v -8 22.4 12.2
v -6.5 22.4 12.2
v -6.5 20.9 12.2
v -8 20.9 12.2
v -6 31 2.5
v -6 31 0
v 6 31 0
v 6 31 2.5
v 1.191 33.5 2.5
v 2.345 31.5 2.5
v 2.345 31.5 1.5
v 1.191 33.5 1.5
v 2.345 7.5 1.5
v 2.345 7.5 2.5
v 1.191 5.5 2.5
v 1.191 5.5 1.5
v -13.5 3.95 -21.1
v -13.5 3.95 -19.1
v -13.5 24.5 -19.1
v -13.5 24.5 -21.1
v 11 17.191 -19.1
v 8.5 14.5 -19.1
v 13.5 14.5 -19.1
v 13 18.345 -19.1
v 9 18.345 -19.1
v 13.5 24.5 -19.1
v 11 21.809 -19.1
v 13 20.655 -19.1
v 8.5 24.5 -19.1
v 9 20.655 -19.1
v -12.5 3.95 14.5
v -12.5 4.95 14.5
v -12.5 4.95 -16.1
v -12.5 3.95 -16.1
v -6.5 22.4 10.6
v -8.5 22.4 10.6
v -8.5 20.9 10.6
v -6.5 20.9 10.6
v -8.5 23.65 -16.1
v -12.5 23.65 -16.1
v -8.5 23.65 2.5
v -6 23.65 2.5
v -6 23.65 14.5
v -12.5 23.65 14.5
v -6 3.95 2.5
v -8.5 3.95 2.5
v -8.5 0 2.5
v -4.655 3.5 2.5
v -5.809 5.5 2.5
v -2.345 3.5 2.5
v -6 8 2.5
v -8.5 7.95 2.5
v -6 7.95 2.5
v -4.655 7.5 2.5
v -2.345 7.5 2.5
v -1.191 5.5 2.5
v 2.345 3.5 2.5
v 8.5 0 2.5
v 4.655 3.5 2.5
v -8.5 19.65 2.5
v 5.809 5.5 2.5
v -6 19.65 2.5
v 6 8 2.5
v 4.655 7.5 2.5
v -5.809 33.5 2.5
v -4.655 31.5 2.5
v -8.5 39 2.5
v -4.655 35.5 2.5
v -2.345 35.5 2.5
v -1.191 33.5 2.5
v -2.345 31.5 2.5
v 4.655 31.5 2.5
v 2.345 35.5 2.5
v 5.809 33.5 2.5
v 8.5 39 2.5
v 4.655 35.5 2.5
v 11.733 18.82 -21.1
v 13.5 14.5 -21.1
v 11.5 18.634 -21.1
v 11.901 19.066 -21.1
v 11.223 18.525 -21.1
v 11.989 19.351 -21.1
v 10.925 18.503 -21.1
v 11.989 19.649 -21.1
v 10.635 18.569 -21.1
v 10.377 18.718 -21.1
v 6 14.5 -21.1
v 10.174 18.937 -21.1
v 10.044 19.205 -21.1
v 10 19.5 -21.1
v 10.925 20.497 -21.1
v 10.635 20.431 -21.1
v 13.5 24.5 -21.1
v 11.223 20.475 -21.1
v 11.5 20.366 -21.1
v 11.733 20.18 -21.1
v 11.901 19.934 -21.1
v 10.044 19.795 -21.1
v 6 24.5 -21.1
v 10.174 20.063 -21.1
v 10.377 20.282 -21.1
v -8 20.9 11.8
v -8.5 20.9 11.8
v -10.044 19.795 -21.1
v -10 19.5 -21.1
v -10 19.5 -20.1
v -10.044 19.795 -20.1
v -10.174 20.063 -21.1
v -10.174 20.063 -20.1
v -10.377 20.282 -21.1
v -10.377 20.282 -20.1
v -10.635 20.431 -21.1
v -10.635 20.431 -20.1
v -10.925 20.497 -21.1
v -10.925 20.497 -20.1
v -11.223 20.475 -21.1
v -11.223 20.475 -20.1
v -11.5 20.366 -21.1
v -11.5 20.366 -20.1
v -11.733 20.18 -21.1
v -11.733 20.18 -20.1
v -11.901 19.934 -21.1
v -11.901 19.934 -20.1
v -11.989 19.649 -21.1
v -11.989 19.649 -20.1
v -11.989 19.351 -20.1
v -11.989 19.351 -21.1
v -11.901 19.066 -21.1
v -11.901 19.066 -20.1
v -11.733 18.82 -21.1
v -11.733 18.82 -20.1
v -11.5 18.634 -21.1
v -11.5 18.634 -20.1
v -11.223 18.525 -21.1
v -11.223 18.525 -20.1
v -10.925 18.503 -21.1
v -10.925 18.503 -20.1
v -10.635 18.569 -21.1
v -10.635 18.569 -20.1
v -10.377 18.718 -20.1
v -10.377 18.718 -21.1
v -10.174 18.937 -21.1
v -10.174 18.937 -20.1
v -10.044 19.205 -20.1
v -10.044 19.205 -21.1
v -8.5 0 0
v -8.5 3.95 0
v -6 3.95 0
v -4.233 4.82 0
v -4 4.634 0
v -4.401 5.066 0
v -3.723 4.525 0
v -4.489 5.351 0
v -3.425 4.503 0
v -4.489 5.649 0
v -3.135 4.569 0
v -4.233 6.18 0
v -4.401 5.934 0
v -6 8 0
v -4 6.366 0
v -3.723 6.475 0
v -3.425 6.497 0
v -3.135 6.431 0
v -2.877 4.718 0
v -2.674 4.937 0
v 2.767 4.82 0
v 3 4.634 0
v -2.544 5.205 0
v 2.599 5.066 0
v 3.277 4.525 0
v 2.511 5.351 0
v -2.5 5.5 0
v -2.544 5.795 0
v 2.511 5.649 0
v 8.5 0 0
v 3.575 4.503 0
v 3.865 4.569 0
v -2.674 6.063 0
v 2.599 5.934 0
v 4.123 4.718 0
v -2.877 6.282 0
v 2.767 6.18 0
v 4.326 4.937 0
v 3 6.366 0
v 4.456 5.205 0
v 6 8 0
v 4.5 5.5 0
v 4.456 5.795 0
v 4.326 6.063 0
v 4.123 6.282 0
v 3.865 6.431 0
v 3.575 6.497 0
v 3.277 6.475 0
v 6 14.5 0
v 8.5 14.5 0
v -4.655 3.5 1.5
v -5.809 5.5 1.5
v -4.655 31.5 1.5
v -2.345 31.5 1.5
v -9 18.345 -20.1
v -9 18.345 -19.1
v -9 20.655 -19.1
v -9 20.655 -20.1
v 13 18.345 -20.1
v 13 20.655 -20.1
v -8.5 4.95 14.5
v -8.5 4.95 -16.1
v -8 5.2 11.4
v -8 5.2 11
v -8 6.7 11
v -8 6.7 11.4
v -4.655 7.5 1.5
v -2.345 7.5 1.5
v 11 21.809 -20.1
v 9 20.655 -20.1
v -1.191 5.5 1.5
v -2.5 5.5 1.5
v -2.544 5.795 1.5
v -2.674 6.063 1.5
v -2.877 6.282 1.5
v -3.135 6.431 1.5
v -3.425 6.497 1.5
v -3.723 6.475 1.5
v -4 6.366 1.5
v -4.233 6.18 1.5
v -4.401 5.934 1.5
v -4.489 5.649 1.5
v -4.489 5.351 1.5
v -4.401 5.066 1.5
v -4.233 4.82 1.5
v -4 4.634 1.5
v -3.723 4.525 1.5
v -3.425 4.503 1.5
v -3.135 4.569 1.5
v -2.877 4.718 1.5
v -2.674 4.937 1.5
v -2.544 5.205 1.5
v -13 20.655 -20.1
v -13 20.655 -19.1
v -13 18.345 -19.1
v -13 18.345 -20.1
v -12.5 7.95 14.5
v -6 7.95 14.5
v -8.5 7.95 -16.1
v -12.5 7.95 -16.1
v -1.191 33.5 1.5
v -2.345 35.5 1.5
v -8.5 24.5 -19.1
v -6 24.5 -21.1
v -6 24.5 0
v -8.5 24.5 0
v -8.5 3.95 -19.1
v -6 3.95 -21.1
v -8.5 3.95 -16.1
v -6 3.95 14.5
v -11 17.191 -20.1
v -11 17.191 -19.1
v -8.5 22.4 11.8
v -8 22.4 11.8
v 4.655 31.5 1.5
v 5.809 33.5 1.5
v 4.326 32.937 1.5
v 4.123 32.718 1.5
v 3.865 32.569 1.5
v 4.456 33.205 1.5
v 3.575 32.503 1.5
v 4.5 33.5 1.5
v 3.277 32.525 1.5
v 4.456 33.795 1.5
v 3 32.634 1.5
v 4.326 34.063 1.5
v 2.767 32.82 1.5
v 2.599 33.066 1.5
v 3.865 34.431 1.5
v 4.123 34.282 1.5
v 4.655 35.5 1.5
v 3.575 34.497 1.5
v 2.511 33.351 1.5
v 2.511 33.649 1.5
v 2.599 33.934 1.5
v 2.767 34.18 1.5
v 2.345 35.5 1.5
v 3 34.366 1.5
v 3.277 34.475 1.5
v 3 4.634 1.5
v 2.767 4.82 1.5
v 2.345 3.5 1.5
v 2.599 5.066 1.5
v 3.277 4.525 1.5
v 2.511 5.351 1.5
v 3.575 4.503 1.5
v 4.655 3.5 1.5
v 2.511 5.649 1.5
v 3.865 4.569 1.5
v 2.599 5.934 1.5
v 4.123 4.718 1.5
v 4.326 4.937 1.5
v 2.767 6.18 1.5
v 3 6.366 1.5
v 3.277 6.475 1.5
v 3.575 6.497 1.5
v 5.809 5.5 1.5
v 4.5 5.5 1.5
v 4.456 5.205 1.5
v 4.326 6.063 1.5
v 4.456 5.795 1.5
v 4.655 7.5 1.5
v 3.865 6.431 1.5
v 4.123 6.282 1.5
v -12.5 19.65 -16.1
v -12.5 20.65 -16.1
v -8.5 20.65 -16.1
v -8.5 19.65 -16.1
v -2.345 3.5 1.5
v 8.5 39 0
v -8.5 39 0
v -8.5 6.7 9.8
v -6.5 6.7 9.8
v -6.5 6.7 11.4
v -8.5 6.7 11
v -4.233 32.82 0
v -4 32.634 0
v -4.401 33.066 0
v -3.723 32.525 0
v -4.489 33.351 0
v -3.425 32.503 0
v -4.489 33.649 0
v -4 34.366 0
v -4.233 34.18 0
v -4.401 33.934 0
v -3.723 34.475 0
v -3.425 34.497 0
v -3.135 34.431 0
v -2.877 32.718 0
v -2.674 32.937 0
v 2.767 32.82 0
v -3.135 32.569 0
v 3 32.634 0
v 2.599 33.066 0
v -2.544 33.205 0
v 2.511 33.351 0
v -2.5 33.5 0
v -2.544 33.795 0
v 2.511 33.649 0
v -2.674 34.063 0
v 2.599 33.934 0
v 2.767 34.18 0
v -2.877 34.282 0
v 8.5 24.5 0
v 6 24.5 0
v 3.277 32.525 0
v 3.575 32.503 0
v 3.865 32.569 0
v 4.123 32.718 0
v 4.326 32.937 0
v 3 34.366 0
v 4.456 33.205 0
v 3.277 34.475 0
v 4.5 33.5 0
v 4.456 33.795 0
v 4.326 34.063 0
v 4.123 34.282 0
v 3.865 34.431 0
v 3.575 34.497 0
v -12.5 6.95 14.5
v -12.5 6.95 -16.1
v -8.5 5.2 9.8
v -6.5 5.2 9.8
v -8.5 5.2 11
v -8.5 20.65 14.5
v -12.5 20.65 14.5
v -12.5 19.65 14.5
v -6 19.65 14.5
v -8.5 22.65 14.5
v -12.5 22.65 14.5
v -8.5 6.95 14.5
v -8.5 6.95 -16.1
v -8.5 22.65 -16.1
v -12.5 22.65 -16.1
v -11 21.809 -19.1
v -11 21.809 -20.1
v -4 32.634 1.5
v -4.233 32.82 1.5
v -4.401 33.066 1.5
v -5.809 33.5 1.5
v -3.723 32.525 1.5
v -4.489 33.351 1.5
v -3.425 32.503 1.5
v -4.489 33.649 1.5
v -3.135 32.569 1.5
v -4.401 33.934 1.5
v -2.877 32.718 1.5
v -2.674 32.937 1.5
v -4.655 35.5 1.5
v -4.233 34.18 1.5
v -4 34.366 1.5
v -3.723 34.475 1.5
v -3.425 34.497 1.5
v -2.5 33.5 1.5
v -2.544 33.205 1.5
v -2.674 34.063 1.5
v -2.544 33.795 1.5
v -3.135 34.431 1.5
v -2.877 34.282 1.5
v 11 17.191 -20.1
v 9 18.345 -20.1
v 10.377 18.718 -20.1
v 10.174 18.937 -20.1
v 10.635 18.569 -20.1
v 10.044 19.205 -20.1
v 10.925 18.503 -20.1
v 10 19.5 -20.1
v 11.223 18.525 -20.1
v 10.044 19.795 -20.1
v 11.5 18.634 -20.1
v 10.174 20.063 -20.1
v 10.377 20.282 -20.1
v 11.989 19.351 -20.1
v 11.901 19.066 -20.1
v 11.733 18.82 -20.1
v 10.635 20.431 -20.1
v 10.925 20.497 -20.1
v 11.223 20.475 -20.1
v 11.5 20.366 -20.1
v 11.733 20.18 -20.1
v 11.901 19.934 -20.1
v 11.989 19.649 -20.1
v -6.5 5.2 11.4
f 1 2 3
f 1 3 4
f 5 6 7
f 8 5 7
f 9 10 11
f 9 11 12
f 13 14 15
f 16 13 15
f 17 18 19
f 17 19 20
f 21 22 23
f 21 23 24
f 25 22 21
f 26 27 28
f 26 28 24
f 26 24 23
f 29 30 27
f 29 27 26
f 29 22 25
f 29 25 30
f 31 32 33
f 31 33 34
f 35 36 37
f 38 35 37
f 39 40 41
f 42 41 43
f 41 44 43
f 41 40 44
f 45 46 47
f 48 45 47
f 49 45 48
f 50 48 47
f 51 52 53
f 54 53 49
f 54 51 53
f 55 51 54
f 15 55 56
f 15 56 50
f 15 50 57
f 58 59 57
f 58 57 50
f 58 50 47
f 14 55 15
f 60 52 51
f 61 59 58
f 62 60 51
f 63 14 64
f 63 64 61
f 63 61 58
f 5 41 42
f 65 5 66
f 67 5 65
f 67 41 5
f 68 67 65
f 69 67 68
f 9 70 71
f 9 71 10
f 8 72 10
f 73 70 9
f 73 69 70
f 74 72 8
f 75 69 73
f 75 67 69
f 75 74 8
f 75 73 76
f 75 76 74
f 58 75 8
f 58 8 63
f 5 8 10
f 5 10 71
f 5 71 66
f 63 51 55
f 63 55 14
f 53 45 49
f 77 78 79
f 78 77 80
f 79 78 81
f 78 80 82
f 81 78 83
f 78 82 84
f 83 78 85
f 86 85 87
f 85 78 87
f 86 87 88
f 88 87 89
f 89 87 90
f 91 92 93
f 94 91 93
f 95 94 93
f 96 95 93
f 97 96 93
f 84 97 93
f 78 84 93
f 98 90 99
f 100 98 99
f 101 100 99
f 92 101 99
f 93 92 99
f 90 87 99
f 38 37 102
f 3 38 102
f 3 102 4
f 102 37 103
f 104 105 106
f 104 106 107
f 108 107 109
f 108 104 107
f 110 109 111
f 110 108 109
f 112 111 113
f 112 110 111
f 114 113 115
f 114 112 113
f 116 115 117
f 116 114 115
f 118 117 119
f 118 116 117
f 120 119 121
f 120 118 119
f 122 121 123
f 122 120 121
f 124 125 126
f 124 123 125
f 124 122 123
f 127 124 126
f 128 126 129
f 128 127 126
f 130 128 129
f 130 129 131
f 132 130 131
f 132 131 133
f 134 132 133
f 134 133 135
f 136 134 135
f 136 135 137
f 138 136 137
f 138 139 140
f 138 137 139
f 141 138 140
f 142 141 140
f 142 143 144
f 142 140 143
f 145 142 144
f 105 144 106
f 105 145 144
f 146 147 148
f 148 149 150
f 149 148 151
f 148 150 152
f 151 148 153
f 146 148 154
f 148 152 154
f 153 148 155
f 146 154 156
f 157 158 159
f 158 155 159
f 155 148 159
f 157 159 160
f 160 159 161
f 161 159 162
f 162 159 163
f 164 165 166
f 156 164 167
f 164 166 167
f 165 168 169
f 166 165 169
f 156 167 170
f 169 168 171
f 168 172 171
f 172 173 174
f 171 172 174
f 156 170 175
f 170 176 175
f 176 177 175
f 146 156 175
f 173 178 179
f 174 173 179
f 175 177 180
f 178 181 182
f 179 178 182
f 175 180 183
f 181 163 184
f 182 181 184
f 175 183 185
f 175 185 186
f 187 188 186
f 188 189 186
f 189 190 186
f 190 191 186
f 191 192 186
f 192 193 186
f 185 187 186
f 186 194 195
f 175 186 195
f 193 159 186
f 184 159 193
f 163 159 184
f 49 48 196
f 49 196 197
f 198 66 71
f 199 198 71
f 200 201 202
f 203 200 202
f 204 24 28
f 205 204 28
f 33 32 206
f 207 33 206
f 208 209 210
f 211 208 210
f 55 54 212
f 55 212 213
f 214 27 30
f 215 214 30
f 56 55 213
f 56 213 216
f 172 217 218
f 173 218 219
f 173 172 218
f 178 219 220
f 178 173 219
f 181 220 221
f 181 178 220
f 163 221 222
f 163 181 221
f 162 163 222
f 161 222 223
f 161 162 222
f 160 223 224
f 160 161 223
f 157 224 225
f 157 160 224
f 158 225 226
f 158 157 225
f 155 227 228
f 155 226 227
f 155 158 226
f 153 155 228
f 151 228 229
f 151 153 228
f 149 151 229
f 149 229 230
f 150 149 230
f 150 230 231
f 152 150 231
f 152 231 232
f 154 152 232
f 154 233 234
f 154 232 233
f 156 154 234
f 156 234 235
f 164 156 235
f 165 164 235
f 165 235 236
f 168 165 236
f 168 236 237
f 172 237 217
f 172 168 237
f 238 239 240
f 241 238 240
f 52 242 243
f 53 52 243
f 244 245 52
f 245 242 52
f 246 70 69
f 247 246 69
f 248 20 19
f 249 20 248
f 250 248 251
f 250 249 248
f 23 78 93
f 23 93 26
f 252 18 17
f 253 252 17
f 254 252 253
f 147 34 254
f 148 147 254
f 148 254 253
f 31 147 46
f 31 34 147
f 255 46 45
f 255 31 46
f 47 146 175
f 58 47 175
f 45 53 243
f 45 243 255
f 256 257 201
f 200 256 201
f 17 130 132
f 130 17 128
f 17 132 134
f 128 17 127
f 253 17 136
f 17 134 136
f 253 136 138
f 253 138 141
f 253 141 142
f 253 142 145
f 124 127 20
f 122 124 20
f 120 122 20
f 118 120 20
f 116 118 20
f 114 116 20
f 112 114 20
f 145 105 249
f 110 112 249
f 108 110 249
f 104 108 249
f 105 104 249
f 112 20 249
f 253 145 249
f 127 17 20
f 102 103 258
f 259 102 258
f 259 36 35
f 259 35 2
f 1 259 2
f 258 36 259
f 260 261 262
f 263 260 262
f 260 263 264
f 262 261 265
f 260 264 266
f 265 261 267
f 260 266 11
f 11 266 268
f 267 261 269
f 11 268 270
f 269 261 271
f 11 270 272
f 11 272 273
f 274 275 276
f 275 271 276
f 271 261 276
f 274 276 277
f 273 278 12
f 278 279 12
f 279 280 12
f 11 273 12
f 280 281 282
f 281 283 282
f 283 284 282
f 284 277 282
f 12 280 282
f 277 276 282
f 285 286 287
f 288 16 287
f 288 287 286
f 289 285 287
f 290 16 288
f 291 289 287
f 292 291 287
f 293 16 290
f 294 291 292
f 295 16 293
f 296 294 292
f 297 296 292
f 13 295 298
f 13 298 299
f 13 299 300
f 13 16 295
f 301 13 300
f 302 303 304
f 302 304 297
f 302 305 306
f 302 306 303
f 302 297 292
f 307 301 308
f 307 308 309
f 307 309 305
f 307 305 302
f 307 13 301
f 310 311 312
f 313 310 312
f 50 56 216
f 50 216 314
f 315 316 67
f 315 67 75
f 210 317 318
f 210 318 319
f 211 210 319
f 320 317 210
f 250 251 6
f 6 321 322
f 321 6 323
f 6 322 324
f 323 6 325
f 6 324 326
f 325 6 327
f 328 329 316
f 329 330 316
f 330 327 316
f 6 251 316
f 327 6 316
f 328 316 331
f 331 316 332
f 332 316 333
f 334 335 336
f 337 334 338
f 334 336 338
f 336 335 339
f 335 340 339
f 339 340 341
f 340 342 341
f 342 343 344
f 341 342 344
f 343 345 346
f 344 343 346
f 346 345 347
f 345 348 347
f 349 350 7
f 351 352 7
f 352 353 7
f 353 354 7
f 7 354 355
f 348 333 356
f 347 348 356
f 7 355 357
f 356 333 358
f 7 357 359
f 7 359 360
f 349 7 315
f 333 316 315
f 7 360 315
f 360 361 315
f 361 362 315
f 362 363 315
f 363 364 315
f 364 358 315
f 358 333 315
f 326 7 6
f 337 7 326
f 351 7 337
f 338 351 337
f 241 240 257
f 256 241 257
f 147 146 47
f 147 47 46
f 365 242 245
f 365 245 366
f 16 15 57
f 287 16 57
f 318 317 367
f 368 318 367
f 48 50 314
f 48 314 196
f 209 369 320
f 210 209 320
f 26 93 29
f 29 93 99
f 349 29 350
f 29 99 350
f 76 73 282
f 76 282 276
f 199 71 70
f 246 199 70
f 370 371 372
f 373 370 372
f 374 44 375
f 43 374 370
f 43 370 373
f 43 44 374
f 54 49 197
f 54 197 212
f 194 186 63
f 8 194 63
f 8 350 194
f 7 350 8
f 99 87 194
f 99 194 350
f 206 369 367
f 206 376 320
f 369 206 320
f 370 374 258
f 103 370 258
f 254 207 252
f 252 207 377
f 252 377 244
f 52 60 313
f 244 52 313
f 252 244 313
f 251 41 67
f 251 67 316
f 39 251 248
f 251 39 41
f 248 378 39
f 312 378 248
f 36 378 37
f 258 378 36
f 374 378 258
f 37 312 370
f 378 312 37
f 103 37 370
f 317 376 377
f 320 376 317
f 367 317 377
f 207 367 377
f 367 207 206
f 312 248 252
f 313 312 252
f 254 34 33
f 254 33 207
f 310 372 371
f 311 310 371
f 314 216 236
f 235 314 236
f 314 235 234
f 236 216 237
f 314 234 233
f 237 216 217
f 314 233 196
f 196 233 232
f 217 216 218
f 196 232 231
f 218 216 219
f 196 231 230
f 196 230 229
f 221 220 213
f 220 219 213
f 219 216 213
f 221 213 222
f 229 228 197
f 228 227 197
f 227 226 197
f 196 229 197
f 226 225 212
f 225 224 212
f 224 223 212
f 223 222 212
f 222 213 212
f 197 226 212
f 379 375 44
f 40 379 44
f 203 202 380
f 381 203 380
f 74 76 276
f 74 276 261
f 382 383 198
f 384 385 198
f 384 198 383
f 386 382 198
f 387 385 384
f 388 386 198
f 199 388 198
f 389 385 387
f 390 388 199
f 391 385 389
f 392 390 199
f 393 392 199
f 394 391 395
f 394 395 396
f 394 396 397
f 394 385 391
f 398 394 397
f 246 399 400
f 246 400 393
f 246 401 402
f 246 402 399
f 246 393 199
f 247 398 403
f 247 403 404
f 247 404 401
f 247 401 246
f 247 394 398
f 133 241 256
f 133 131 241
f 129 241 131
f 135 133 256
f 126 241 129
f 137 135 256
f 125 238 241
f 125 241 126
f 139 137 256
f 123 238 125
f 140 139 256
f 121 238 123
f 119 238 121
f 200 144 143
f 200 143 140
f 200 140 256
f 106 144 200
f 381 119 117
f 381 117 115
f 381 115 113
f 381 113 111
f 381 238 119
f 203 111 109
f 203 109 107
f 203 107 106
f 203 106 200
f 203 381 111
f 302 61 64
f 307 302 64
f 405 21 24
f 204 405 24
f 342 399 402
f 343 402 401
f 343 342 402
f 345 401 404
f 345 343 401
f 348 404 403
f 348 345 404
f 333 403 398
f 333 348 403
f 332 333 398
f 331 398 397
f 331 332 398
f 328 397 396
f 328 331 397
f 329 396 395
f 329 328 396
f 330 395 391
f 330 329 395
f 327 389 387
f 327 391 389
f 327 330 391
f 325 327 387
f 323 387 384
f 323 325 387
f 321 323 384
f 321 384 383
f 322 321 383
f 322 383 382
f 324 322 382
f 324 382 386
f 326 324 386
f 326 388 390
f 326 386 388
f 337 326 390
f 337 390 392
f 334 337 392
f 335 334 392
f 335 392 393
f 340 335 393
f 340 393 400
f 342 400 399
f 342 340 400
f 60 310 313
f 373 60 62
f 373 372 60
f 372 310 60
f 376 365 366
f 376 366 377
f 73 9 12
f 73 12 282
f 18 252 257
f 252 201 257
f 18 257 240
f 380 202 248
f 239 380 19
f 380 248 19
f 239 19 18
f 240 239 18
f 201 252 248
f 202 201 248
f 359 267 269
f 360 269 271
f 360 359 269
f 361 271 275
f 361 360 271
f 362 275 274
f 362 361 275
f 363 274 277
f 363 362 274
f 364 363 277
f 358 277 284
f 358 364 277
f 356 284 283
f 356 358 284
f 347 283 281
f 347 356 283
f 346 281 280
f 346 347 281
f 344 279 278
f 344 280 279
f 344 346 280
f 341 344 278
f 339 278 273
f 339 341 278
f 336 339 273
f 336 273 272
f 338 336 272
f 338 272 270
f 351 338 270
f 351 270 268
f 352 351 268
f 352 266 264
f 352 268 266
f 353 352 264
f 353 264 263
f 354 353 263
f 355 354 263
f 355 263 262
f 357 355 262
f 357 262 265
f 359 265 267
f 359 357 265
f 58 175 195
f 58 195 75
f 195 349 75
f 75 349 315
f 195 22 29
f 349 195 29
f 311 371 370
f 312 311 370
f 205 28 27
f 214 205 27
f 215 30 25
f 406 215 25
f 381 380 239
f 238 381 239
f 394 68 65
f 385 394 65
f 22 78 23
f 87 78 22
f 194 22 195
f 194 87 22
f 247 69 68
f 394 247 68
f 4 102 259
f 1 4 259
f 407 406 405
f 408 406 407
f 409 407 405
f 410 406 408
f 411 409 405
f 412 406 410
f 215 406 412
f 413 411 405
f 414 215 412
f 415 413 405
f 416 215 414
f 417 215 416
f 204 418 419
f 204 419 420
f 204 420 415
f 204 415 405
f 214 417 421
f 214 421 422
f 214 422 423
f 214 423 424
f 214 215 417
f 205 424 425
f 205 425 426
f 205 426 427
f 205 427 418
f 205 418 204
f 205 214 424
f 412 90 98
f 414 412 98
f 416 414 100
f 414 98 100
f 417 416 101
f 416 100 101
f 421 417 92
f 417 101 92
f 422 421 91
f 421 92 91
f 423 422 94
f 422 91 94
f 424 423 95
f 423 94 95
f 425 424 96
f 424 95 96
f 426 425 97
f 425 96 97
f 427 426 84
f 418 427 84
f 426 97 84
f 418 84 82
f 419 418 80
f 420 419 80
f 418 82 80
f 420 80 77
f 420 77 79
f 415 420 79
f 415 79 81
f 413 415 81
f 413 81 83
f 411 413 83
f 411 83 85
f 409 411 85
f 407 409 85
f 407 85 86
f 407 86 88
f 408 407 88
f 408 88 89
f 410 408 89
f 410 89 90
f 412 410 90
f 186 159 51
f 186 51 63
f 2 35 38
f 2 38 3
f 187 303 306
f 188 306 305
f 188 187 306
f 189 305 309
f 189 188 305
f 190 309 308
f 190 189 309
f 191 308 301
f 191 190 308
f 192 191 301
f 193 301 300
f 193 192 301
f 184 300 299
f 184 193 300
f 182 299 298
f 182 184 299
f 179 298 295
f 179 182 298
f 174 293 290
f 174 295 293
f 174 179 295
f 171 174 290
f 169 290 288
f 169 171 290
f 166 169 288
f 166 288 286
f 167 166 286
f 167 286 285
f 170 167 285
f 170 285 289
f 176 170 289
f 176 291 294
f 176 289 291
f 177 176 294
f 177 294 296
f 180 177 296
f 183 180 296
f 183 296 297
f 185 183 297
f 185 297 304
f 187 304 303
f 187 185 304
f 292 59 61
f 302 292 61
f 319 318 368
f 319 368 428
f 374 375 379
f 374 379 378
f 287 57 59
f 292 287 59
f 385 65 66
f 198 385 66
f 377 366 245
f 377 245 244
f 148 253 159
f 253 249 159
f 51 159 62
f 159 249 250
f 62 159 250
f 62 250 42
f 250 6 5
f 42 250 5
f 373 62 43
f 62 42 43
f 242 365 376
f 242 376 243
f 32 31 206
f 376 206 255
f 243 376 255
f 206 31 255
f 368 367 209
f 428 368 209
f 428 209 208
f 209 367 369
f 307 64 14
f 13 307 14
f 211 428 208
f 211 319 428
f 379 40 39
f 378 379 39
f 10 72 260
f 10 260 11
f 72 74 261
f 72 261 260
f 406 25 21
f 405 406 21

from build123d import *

# Parameters (mm, degrees)
SKETCH1_W                     = 17
SKETCH1_H                     = 39
SKETCH1_R                     = 1
SKETCH1_W_2                   = 12
SKETCH1_H_2                   = 23
SERVOBRACKET_DEPTH            = 2.5
SKETCH1_5_W                   = 2.5
SKETCH1_5_H                   = 10
SUPPORTLEGS_DEPTH             = 21.1
SKETCH2_W                     = 2
SKETCH2_H                     = 10
SUPPORTFOOT_DEPTH             = 5
BASEBOLTHOLE_START            = -3
SKETCH3_R                     = 1
BASEBOLTHOLE_DEPTH            = 25.6
SERVONUTSLOTS_DEPTH           = 1
BASENUTSLOTS_DEPTH            = 1
SKETCH6_W                     = 2.5
SKETCH6_H                     = 4
TUBEHOLDERBASE_DEPTH          = 12
SKETCH7_W                     = 4
SKETCH7_H                     = 1
TUBEHOLDERSTIFFENERRIBS_DEPTH = 30.6
SKETCH8_W                     = 1
SKETCH8_H                     = 1
SKETCH8_H_2                   = 0.25
TUBECLIPENTRANCES_DEPTH       = 2
SKETCH9_W                     = 1.5
SKETCH9_H                     = 1.5
TUBECLIPLOCKSLOT_DEPTH        = 0.6
TUBECLIPLOCKSLOT2_DEPTH       = 0.6
SUPPORTLEGEXTENSION_DEPTH     = 10.55
SKETCH8_4_W                   = 0.2
SKETCH8_4_H                   = 1.5
TUBECLIPLOCKCLEARANCE_DEPTH   = 0.5


with BuildPart() as part:
    # Sketch1 → ServoBracket (new body)
    with BuildSketch(Plane.XY):
        with Locations((0, 19.5)):
            Rectangle(SKETCH1_W, SKETCH1_H)
        with Locations((-3.5, 33.5)):
            Circle(SKETCH1_R, mode=Mode.SUBTRACT)
        with Locations((-3.5, 5.5)):
            Circle(SKETCH1_R, mode=Mode.SUBTRACT)
        with Locations((3.5, 5.5)):
            Circle(SKETCH1_R, mode=Mode.SUBTRACT)
        with Locations((3.5, 33.5)):
            Circle(SKETCH1_R, mode=Mode.SUBTRACT)
        with Locations((0, 19.5)):
            Rectangle(SKETCH1_W_2, SKETCH1_H_2, mode=Mode.SUBTRACT)
    extrude(amount=SERVOBRACKET_DEPTH)

    # Sketch1_5 → SupportLegs (add)
    with BuildSketch(Plane.XY):
        with Locations((-7.25, 19.5)):
            Rectangle(SKETCH1_5_W, SKETCH1_5_H)
        with Locations((7.25, 19.5)):
            Rectangle(SKETCH1_5_W, SKETCH1_5_H)
    extrude(amount=-SUPPORTLEGS_DEPTH)

    # Sketch2 → SupportFoot (add)
    with BuildSketch(Plane.ZY.offset(8.5)):
        with Locations((-20.1, 19.5)):
            Rectangle(SKETCH2_W, SKETCH2_H)
    supportfoot = extrude(amount=SUPPORTFOOT_DEPTH)

    # Sketch3 → BaseBoltHole (cut)
    with BuildSketch(Plane.XY.offset(-19.1).offset(BASEBOLTHOLE_START)):
        with Locations((-11, 19.5)):
            Circle(SKETCH3_R)
    basebolthole = extrude(amount=BASEBOLTHOLE_DEPTH, mode=Mode.SUBTRACT)

    # SupportFoot2: SupportFoot, BaseBoltHole across plane
    add(supportfoot.mirror(Plane(origin=(0, 0, 0), x_dir=(0, 0, 1), z_dir=(1, 0, 0))))
    add(basebolthole.mirror(Plane(origin=(0, 0, 0), x_dir=(0, 0, 1), z_dir=(1, 0, 0))), mode=Mode.SUBTRACT)

    # Sketch4 → ServoNutSlots (cut)
    with BuildSketch(Plane.XY.offset(2.5)):
        Polygon((-4.654700538, 7.5), (-2.345299462, 7.5), (-1.190598923, 5.5), (-2.345299462, 3.5), (-4.654700538, 3.5), (-5.809401077, 5.5), align=None)
        Polygon((-1.190598923, 33.5), (-2.345299462, 35.5), (-4.654700538, 35.5), (-5.809401077, 33.5), (-4.654700538, 31.5), (-2.345299462, 31.5), align=None)
        Polygon((2.345299462, 31.5), (1.190598923, 33.5), (2.345299462, 35.5), (4.654700538, 35.5), (5.809401077, 33.5), (4.654700538, 31.5), align=None)
        Polygon((4.654700538, 7.5), (2.345299462, 7.5), (1.190598923, 5.5), (2.345299462, 3.5), (4.654700538, 3.5), (5.809401077, 5.5), align=None)
    extrude(amount=-SERVONUTSLOTS_DEPTH, mode=Mode.SUBTRACT)

    # Sketch5 → BaseNutSlots (cut)
    with BuildSketch(Plane.XY.offset(-19.1)):
        Polygon((-11, 21.809401077), (-13, 20.654700538), (-13, 18.345299462), (-11, 17.190598923), (-9, 18.345299462), (-9, 20.654700538), align=None)
        Polygon((11, 21.809401077), (9, 20.654700538), (9, 18.345299462), (11, 17.190598923), (13, 18.345299462), (13, 20.654700538), align=None)
    extrude(amount=-BASENUTSLOTS_DEPTH, mode=Mode.SUBTRACT)

    # Sketch6 → TubeHolderBase (add)
    with BuildSketch(Plane.XY.offset(2.5)):
        with Locations((-7.25, 21.65)):
            Rectangle(SKETCH6_W, SKETCH6_H)
    tubeholderbase = extrude(amount=TUBEHOLDERBASE_DEPTH)

    # Sketch7 → TubeHolderStiffenerRibs (add)
    with BuildSketch(Plane.XY.offset(14.5)):
        with Locations((-10.5, 23.15)):
            Rectangle(SKETCH7_W, SKETCH7_H)
        with Locations((-10.5, 20.15)):
            Rectangle(SKETCH7_W, SKETCH7_H)
    tubeholderstiffenerribs = extrude(amount=-TUBEHOLDERSTIFFENERRIBS_DEPTH)

    # TubeHolder2: TubeHolderBase, TubeHolderStiffenerRibs across plane
    add(tubeholderbase.mirror(Plane.ZX.offset(13.8)))
    add(tubeholderstiffenerribs.mirror(Plane.ZX.offset(13.8)))

    # Sketch8 → TubeClipEntrances (cut)
    with BuildSketch(Plane.ZY.offset(8.5)):
        with Locations((11.1, 21.65)):
            Rectangle(SKETCH8_W, SKETCH8_H)
        with Locations((11.1, 22.275)):
            Rectangle(SKETCH8_W, SKETCH8_H_2)
        with Locations((11.1, 21.025)):
            Rectangle(SKETCH8_W, SKETCH8_H_2)
        with Locations((10.3, 6.575)):
            Rectangle(SKETCH8_W, SKETCH8_H_2)
        with Locations((10.3, 5.325)):
            Rectangle(SKETCH8_W, SKETCH8_H_2)
        with Locations((10.3, 5.95)):
            Rectangle(SKETCH8_W, SKETCH8_H)
    extrude(amount=-TUBECLIPENTRANCES_DEPTH, mode=Mode.SUBTRACT)

    # Sketch9 → TubeClipLockSlot (cut)
    with BuildSketch(Plane(origin=(0, 0, 11.6), x_dir=(-1, 0, 0), z_dir=(0, 0, -1))):
        with Locations((7.25, 21.65)):
            Rectangle(SKETCH9_W, SKETCH9_H)
    extrude(amount=-TUBECLIPLOCKSLOT_DEPTH, mode=Mode.SUBTRACT)

    # Sketch10 → TubeClipLockSlot2 (cut)
    with BuildSketch(Plane(origin=(0, 0, 10.8), x_dir=(-1, 0, 0), z_dir=(0, 0, -1))):
        Polygon((6.5, 5.45), (6.5, 5.2), (8, 5.2), (8, 6.7), (6.5, 6.7), align=None)
    extrude(amount=-TUBECLIPLOCKSLOT2_DEPTH, mode=Mode.SUBTRACT)

    # Sketch11 → SupportLegExtension (add)
    with BuildSketch(Plane.XZ.offset(-14.5)):
        Polygon((-6, 0), (-8.5, 0), (-8.5, -19.1), (-13.5, -19.1), (-13.5, -21.1), (-6, -21.1), align=None)
    extrude(amount=SUPPORTLEGEXTENSION_DEPTH)

    # Sketch8_4 → TubeClipLockClearance (cut)
    with BuildSketch(Plane.ZY.offset(8.5)):
        with Locations((10.9, 5.95)):
            Rectangle(SKETCH8_4_W, SKETCH8_4_H)
        with Locations((11.7, 21.65)):
            Rectangle(SKETCH8_4_W, SKETCH8_4_H)
    extrude(amount=-TUBECLIPLOCKCLEARANCE_DEPTH, mode=Mode.SUBTRACT)


solid = part.part
